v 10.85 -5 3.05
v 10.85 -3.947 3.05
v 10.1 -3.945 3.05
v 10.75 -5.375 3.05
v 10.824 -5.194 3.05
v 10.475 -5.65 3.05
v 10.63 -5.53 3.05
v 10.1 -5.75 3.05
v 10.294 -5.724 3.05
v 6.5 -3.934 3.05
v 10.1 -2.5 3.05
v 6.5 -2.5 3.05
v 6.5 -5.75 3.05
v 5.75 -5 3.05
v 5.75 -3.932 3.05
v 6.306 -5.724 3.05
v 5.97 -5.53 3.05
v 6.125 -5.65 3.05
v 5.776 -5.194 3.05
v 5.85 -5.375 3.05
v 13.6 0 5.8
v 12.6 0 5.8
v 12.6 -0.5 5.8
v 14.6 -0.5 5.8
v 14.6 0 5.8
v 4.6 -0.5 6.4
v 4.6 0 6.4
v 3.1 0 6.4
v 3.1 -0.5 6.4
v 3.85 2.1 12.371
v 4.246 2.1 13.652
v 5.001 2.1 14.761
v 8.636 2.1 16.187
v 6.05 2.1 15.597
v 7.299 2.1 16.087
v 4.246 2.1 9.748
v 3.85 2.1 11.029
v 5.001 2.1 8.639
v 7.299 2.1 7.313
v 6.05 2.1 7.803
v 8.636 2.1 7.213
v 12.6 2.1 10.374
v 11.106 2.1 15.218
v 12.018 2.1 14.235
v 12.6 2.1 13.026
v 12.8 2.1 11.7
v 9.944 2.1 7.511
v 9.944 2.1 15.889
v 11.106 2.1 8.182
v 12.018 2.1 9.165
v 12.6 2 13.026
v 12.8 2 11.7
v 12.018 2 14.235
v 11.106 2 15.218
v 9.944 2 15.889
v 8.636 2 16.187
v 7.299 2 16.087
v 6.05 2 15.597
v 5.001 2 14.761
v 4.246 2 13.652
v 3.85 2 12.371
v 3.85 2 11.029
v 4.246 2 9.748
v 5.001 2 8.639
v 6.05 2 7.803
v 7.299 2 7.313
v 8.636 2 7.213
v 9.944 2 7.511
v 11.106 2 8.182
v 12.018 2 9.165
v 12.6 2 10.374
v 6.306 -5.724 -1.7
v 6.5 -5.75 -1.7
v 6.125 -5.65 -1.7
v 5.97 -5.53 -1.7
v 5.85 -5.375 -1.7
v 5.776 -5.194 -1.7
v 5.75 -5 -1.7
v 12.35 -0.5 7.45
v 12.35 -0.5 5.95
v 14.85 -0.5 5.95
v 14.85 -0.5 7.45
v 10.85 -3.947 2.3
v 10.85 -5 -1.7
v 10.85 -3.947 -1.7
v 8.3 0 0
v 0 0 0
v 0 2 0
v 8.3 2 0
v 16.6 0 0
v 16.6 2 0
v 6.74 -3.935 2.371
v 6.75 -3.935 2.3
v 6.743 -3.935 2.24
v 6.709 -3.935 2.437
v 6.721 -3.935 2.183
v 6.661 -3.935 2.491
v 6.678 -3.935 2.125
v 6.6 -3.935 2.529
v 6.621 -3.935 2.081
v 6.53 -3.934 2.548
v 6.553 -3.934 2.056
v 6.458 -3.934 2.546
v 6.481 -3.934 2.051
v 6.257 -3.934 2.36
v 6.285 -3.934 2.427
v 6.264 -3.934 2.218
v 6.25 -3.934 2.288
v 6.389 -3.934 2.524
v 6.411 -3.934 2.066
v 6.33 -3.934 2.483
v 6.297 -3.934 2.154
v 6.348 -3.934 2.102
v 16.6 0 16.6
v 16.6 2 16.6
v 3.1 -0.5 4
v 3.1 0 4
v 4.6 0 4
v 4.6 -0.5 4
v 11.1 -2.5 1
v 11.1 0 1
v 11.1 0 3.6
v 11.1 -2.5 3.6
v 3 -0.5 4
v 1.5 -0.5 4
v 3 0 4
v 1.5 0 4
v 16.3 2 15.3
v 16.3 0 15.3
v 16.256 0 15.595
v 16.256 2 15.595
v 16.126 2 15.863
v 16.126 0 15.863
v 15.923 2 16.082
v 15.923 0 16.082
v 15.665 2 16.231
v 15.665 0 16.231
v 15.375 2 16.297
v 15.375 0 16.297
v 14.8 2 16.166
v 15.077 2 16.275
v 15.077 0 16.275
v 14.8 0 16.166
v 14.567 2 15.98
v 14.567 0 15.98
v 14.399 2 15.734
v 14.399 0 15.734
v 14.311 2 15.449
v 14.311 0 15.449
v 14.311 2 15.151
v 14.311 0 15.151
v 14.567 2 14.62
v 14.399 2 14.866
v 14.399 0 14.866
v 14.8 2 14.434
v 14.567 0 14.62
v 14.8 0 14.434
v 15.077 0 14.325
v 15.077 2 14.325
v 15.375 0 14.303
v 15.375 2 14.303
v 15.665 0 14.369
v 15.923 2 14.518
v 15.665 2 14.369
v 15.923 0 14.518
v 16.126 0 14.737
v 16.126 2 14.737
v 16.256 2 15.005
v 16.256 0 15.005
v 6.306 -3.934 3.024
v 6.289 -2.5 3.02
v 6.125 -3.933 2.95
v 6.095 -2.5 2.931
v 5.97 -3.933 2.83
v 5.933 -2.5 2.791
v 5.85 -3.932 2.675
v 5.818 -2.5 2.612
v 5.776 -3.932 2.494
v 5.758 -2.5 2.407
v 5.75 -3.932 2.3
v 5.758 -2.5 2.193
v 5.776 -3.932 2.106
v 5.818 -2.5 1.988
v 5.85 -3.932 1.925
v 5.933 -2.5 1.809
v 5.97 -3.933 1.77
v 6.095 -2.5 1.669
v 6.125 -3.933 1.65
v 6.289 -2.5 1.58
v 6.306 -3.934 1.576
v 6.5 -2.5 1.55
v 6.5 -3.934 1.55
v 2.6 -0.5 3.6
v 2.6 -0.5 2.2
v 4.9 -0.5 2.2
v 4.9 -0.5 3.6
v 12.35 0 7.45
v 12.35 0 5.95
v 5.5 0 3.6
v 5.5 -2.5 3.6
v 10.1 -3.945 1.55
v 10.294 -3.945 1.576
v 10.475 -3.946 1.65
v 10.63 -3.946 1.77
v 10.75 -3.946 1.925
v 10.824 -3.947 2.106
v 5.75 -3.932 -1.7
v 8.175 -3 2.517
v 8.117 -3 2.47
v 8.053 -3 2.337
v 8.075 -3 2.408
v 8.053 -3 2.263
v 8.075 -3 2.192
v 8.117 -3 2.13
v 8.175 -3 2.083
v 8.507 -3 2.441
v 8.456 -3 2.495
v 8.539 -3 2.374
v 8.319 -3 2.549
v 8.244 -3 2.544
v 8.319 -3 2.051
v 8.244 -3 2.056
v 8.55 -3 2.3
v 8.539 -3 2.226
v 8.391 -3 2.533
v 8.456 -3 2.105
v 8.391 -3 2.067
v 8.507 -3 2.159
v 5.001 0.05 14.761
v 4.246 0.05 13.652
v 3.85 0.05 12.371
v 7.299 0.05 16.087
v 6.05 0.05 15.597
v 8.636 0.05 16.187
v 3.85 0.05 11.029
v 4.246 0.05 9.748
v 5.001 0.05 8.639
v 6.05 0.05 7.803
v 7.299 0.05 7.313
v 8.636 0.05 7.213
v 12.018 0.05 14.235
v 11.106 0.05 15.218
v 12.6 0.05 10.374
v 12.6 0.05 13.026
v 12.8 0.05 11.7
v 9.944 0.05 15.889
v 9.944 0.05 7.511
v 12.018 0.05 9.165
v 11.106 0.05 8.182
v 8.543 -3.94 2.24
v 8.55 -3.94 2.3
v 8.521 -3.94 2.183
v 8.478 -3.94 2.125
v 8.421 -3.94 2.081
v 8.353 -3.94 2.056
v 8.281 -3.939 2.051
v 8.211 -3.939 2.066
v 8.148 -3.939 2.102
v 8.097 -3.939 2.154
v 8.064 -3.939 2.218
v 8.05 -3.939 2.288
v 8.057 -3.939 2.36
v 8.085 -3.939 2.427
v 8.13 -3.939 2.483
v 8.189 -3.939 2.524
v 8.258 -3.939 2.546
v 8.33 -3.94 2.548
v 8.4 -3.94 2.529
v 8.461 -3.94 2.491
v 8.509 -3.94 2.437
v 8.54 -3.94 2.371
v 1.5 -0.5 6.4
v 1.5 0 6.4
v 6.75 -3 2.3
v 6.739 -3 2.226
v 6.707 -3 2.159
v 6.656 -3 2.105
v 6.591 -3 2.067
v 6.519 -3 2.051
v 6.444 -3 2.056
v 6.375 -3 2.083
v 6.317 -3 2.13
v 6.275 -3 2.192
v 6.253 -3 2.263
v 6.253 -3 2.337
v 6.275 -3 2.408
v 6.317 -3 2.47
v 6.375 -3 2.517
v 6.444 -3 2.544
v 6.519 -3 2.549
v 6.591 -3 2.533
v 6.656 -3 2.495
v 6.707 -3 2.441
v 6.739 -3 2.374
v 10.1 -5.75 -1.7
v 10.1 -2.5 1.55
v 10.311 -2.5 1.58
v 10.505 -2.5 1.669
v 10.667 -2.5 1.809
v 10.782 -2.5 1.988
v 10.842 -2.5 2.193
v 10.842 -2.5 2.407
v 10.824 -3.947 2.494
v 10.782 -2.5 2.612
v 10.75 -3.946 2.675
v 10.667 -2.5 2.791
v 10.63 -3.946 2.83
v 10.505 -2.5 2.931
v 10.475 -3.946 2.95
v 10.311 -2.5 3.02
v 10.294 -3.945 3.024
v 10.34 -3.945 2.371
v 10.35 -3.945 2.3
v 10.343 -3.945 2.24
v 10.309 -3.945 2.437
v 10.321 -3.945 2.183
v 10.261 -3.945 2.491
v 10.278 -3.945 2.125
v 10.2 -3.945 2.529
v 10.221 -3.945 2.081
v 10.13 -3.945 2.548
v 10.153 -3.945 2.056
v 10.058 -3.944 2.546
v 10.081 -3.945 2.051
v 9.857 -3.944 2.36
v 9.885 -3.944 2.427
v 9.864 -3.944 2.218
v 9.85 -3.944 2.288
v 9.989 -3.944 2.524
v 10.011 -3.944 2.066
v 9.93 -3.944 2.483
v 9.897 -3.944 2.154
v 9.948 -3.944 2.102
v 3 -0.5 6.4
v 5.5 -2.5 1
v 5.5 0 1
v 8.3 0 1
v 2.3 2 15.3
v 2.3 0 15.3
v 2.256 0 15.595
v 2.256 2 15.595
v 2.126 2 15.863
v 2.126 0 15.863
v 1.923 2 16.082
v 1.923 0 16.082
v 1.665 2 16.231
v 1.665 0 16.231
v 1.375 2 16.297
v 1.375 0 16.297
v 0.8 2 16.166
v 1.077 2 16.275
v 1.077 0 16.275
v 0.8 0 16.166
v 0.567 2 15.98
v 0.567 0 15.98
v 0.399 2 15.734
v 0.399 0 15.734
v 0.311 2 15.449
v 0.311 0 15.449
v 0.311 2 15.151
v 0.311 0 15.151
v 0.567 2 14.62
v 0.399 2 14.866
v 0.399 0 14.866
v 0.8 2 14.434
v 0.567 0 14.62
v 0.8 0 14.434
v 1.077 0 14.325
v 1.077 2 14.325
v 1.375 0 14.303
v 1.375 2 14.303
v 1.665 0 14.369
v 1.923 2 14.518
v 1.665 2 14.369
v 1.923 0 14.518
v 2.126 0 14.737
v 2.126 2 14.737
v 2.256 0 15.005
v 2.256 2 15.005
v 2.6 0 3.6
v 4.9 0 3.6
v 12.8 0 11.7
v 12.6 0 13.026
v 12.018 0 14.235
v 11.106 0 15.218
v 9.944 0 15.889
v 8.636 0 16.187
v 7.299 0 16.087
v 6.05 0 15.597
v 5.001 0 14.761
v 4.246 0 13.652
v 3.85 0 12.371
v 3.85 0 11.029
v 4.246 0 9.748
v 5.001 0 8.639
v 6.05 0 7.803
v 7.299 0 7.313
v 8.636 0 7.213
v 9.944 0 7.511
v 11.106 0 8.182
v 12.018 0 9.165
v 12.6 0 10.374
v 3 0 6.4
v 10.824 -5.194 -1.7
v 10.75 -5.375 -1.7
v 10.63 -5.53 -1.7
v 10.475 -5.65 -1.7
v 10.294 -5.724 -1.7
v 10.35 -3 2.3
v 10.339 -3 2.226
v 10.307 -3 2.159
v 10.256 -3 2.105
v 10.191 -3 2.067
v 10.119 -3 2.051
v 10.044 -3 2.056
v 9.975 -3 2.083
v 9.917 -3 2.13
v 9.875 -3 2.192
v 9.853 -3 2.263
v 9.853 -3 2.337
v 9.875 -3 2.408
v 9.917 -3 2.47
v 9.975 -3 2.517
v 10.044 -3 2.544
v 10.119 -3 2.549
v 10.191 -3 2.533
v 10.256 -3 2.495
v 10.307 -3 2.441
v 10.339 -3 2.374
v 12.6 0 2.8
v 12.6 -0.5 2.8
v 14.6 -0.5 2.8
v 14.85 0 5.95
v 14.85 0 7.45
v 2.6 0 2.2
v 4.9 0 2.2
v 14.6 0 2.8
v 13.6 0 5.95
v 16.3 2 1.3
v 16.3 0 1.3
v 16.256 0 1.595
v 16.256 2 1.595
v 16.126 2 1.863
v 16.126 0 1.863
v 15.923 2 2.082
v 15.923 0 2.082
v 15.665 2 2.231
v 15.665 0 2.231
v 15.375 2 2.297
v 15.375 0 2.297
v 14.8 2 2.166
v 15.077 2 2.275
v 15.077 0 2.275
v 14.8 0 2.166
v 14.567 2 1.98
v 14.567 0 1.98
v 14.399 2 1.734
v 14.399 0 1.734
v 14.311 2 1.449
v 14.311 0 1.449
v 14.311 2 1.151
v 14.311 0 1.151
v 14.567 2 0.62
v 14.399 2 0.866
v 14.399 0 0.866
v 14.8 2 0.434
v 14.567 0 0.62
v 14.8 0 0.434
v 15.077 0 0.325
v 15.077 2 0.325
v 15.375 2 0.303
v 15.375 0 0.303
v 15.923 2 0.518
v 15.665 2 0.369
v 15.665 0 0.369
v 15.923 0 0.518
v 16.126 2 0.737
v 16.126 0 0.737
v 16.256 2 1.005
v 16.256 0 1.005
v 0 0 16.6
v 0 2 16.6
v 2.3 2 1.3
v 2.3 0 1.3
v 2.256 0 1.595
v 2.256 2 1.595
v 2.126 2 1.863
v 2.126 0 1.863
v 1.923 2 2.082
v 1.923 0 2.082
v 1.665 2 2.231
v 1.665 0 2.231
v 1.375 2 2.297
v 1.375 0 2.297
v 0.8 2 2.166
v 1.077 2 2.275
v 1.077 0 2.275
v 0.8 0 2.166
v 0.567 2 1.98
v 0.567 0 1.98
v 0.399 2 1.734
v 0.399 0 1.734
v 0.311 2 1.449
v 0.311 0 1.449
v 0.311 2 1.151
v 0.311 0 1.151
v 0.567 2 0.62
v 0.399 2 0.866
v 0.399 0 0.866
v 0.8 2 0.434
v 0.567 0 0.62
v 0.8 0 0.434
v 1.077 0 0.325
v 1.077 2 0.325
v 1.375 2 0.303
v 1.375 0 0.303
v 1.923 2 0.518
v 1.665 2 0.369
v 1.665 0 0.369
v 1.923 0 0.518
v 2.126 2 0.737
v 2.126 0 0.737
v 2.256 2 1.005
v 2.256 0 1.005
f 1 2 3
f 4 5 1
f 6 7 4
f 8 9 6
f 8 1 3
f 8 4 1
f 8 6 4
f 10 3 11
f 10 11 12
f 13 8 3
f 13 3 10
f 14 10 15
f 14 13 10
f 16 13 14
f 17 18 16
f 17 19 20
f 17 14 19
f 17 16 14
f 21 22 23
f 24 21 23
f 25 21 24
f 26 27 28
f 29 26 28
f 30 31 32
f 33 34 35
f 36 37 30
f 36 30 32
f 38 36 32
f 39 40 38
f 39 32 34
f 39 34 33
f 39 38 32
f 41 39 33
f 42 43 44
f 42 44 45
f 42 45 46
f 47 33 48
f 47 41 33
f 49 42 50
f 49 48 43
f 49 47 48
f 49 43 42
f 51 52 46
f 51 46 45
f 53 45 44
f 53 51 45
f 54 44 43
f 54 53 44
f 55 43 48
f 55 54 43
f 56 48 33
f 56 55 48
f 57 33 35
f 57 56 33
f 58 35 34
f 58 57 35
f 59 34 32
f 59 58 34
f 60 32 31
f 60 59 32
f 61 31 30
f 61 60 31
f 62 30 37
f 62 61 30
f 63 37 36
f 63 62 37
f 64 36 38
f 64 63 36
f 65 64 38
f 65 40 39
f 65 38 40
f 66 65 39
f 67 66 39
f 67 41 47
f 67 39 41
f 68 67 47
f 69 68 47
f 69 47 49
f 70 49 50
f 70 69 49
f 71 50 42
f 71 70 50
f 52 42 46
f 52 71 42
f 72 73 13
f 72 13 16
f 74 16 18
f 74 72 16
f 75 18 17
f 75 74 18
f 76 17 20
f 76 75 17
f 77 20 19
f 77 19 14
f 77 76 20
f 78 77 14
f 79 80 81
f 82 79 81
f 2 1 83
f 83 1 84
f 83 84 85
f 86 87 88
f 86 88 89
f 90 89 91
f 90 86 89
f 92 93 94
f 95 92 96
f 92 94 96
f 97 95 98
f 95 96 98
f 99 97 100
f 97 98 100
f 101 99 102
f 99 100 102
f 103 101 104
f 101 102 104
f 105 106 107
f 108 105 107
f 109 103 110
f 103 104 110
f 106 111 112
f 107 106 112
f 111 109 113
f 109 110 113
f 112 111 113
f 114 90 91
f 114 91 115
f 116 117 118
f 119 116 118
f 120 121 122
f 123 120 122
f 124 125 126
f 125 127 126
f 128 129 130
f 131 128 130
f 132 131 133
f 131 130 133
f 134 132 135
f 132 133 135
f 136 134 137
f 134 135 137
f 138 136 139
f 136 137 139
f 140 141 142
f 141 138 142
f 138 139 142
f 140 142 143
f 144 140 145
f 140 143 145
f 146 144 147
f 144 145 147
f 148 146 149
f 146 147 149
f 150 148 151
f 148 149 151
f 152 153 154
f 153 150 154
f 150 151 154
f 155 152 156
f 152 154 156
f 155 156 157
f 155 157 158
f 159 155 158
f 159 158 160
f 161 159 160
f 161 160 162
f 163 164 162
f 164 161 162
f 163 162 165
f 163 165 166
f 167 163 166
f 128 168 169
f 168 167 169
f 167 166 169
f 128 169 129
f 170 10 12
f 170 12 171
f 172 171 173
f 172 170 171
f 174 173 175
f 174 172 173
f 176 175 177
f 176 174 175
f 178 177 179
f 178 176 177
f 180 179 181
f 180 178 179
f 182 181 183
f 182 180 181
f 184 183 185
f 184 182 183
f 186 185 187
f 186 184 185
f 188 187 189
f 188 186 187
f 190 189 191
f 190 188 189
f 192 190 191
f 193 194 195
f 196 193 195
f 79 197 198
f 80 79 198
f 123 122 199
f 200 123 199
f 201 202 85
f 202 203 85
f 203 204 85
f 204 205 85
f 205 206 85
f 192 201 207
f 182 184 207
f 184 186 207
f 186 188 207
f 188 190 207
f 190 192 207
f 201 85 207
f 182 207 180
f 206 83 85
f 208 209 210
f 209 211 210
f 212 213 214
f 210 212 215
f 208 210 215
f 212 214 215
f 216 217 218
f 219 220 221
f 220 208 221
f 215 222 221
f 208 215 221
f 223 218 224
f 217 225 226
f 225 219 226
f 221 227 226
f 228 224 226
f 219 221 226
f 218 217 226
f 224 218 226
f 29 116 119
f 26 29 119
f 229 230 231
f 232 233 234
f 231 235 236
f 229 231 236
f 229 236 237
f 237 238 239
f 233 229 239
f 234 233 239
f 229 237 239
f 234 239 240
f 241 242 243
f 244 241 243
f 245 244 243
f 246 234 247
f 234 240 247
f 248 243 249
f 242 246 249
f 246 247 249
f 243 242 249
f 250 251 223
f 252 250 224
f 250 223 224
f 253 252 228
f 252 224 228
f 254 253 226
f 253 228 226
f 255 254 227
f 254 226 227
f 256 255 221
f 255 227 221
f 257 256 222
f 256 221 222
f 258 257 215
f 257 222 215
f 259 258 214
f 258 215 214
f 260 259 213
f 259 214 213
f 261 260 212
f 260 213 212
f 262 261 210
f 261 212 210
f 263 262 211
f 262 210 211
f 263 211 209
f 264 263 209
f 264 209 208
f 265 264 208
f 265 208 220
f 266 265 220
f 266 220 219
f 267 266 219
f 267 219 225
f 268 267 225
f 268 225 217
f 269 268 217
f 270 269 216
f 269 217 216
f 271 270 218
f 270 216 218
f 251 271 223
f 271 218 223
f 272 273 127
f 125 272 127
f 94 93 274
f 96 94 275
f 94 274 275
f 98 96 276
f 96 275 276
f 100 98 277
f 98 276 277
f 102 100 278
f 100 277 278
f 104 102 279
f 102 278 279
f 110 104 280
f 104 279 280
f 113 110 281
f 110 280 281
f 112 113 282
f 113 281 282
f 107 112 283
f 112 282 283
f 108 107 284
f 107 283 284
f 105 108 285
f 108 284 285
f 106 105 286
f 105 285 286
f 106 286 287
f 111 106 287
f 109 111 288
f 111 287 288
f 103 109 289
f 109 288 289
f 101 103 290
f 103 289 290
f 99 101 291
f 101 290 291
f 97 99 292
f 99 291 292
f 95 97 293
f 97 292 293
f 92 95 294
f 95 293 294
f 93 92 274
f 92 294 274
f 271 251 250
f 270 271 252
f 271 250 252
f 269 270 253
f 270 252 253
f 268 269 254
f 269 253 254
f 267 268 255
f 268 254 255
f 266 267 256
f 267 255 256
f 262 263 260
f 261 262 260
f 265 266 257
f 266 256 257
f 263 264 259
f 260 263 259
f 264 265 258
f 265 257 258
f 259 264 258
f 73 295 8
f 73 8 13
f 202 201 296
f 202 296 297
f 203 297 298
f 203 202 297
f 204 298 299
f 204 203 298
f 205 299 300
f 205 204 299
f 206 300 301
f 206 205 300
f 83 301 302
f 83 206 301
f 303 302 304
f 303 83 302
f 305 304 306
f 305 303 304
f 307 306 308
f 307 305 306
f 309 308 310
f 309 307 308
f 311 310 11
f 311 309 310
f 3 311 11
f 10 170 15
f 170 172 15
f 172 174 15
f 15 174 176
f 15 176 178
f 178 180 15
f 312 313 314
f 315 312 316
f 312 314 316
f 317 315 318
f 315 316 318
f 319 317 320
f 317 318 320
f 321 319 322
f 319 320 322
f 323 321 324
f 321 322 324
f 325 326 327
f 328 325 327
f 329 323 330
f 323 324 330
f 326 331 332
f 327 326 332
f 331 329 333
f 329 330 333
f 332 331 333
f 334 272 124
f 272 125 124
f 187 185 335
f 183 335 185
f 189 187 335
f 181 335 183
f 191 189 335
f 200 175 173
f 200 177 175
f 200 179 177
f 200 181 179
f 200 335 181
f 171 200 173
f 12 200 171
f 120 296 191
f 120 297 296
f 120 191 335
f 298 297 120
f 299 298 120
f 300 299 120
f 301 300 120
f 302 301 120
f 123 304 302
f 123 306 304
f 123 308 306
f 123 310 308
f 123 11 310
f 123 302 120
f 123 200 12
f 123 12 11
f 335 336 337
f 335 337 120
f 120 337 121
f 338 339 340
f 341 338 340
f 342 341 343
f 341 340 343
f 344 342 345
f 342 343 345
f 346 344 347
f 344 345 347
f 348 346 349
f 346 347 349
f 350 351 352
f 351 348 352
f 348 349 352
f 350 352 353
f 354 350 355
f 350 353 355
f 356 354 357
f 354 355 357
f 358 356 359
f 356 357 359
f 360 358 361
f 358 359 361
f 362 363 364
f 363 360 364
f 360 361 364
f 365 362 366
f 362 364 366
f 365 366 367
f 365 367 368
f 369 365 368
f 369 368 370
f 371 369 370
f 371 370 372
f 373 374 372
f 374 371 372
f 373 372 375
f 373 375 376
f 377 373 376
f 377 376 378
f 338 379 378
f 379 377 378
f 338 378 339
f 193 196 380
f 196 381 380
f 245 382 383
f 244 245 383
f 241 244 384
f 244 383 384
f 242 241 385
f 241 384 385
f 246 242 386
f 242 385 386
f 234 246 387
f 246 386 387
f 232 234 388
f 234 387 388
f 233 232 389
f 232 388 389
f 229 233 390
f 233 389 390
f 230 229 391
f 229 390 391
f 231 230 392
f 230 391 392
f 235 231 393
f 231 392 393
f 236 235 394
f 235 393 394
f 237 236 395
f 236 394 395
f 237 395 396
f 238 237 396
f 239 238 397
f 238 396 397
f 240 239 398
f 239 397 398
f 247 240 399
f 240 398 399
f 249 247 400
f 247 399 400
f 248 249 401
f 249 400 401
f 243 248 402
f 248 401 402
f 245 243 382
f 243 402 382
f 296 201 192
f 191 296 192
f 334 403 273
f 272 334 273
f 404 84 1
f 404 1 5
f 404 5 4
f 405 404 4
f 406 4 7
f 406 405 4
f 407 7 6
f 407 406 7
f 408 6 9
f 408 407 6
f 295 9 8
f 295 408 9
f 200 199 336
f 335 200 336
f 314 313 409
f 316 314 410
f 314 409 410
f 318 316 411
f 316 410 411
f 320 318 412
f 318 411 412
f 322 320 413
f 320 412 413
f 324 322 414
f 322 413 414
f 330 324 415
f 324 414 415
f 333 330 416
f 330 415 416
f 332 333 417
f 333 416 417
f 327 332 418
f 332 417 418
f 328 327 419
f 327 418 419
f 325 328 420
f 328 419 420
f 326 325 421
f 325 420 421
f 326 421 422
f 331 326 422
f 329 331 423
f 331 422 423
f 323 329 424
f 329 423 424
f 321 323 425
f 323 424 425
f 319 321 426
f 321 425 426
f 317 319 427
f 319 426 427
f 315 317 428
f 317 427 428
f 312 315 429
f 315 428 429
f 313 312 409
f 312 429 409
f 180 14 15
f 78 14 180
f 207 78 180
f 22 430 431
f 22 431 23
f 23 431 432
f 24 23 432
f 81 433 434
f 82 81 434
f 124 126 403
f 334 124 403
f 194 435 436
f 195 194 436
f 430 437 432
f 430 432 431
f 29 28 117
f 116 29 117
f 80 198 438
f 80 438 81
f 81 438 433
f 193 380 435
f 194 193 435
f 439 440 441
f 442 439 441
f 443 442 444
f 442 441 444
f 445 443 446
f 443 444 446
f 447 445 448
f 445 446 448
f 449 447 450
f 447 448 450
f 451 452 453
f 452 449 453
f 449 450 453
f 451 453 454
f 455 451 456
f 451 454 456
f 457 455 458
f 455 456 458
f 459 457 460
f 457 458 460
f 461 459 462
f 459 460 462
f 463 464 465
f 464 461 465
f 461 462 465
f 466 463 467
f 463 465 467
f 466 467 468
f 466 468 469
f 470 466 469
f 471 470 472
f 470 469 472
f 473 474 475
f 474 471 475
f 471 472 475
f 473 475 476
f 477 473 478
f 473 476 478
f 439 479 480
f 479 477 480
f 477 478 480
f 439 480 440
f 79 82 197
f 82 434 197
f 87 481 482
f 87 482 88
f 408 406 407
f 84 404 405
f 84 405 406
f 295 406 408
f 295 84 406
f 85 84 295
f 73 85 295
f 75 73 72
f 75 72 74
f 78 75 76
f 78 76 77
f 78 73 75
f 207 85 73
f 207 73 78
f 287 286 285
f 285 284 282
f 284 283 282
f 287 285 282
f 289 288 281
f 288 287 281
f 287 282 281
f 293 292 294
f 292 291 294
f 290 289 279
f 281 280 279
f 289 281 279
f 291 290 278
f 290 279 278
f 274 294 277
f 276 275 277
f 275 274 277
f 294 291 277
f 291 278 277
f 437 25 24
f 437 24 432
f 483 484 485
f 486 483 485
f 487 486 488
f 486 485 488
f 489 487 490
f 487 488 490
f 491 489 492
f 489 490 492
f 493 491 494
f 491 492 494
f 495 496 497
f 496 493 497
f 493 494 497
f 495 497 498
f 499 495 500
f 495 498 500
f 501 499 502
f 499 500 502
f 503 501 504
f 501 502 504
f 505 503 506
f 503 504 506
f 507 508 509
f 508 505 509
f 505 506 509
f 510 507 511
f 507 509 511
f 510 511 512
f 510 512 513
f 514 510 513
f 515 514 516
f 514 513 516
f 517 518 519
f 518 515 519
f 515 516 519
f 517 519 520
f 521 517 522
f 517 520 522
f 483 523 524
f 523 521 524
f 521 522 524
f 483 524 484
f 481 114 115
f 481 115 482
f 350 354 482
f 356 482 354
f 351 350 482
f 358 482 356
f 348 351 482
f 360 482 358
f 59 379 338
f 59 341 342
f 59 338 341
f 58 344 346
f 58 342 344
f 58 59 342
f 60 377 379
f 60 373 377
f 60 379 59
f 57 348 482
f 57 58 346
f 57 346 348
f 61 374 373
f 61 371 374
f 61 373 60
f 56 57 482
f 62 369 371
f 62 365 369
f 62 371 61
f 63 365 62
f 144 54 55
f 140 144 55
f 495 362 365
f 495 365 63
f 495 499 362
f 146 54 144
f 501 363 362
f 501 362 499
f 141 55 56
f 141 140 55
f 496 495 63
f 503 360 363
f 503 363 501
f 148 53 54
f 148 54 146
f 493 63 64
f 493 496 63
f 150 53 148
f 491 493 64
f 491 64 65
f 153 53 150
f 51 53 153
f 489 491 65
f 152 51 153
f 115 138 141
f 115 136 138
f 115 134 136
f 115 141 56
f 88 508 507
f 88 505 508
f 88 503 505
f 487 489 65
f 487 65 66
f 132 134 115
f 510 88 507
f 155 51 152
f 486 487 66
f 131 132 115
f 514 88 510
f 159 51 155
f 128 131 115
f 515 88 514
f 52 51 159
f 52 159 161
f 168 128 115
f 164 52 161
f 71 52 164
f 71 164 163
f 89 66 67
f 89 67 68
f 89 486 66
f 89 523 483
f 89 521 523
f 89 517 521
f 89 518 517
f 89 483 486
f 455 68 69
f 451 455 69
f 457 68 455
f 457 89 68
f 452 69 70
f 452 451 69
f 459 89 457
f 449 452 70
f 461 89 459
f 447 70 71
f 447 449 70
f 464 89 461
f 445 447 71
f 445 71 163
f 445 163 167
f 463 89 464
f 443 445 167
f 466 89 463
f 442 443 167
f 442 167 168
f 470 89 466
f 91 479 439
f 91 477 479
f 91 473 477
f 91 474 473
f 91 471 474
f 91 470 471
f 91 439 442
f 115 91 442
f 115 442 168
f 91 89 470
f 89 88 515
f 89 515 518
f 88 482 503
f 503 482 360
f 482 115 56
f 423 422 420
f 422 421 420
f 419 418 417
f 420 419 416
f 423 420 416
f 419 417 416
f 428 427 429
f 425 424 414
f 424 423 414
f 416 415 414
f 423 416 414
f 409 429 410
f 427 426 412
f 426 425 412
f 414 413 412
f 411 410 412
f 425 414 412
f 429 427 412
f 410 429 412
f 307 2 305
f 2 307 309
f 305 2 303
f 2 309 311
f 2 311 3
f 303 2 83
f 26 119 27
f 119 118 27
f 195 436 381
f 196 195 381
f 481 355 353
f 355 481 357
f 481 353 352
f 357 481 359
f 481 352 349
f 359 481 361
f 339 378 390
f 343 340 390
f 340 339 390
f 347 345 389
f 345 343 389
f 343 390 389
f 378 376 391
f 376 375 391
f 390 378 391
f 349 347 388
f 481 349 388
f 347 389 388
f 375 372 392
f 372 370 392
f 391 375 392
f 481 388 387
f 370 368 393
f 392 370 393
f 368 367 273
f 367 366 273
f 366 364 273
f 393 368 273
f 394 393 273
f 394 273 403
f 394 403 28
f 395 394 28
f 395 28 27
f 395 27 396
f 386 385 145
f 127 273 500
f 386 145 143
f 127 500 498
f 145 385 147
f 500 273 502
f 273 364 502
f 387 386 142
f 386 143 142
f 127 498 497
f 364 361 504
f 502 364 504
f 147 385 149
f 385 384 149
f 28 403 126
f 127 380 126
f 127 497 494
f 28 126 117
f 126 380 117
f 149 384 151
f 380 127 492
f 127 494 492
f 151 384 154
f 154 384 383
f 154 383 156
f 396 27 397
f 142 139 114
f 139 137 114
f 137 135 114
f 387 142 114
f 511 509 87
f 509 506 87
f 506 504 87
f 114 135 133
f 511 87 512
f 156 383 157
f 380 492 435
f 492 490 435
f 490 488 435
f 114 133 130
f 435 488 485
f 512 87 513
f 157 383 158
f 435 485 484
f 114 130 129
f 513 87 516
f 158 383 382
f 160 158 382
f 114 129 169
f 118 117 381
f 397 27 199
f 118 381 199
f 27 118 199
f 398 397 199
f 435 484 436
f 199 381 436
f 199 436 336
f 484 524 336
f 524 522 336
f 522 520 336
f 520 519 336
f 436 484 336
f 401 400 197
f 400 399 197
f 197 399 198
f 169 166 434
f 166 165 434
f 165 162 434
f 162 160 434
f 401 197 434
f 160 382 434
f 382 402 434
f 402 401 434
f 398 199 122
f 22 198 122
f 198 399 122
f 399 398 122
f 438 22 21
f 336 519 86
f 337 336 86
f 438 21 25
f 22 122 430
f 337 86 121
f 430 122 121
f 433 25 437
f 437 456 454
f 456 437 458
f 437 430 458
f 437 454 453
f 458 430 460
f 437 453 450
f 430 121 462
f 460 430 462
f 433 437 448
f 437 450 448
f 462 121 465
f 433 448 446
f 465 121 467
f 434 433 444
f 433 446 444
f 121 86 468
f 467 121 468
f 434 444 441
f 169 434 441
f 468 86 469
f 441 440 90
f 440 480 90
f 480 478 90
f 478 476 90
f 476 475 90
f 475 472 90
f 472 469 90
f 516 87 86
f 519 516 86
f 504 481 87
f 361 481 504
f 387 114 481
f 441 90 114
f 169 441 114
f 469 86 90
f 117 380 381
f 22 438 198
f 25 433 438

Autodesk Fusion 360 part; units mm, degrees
sketch "Sketch1" plane through (0, 0, 0) normal (0, 1, 0) x (1, 0, 0)
  line L0 (0, 0) -> (16.6, 0)
  line L1 (16.6, 0) -> (16.6, -16.6)
  line L2 (16.6, -16.6) -> (0, -16.6)
  line L3 (0, -16.6) -> (0, 0)
  line L4 (16.6, -16.6) -> (8.3, -16.6)
  line L5 (8.3, -16.6) -> (8.3, -11.7) construction
  circle A0 centre (8.3, -11.7) radius 4.5
  line L6 (16.6, -16.6) -> (15.3, -16.6)
  line L7 (16.6, -16.6) -> (16.6, -15.3)
  line L8 (15.3, -16.6) -> (15.3, -14) construction
  line L9 (16.6, -15.3) -> (14, -15.3) construction
  circle A1 centre (15.3, -15.3) radius 1
  circle A2 centre (1.3, -15.3) radius 1
  line L10 (0, -8.3) -> (16.6, -8.3) construction
  circle A3 centre (15.3, -1.3) radius 1
  circle A4 centre (1.3, -1.3) radius 1
  line L11 (8.3, 0) -> (8.3, -3.6)
  line L12 (5.5, -1) -> (11.1, -1)
  line L13 (11.1, -1) -> (11.1, -3.6)
  line L14 (11.1, -3.6) -> (5.5, -3.6)
  line L15 (5.5, -3.6) -> (5.5, -1)
  line L16 (13.6, 0) -> (13.6, -5.6) construction
  line L17 (16.6, -5.8) -> (13.6, -5.8) construction
  line L18 (14.6, -2.8) -> (12.6, -2.8)
  line L19 (12.6, -2.8) -> (12.6, -5.8)
  line L20 (12.6, -5.8) -> (14.6, -5.8)
  line L21 (14.6, -5.8) -> (14.6, -2.8)
  line L22 (3.0224, 0) -> (3.0224, -2.2) construction
  line L23 (0, -2.5501) -> (2.6, -2.5501) construction
  line L24 (2.6, -2.2) -> (4.9, -2.2)
  line L25 (4.9, -2.2) -> (4.9, -3.6)
  line L26 (4.9, -3.6) -> (2.6, -3.6)
  line L27 (2.6, -3.6) -> (2.6, -2.2)
  line L28 (0, -5.4812) -> (1.5, -5.4812) construction
  line L29 (2, 0) -> (2, -4) construction
  line L30 (1.5, -4) -> (3, -4)
  line L31 (3, -4) -> (3, -6.4)
  line L32 (3, -6.4) -> (1.5, -6.4)
  line L33 (1.5, -6.4) -> (1.5, -4)
  line L34 (3.1, -4) -> (4.6, -4)
  line L35 (4.6, -4) -> (4.6, -6.4)
  line L36 (4.6, -6.4) -> (3.1, -6.4)
  line L37 (3.1, -6.4) -> (3.1, -4)
  line L38 (0, -6) -> (3.1, -6) construction
  line L39 (12.35, -5.95) -> (14.85, -5.95)
  line L40 (14.85, -5.95) -> (14.85, -7.45)
  line L41 (14.85, -7.45) -> (12.35, -7.45)
  line L42 (12.35, -7.45) -> (12.35, -5.95)
  line L43 (13.6, -5.8) -> (13.6, -5.95)
  dimension "d1" = 16.6
  dimension "d2" = 16.6
  dimension "d3" = 8.3
  dimension "d4" = 4.9
  dimension "d5" = 9
  dimension "d6" = 1.3
  dimension "d7" = 1.3
  dimension "d8" = 2
  dimension "d9" = 3.6
  dimension "d10" = 5.6
  dimension "d11" = 2.6
  dimension "d12" = 5.6
  dimension "d13" = 3
  dimension "d14" = 2
  dimension "d15" = 3
  dimension "d16" = 2.8
  dimension "d17" = 2.2
  dimension "d18" = 2.6
  dimension "d19" = 2.3
  dimension "d20" = 1.4
  dimension "d21" = 1.5
  dimension "d22" = 4
  dimension "d23" = 1.5
  dimension "d24" = 2.4
  dimension "d25" = 1.5
  dimension "d26" = 2.4
  dimension "d27" = 3.1
  dimension "d28" = 2.5
  dimension "d29" = 1.5
  dimension "d30" = 0.15
extrude "Extrude1" add sketch "Sketch1" along normal blind 2 contours L11 L12 L13 L14 | L11 L12 L14 L15 | L0 L1 L2 L3 L4 L6 L7 | A0 | L18 L19 L20 L21 | L39 L40 L41 L42 | L24 L25 L26 L27 | L30 L31 L32 L33 | L34 L35 L36 L37 makes body 1
extrude "Extrude2" add sketch "Sketch1" along normal blind 2.1 contours A0 bodies 1
extrude "Extrude3" cut sketch "Sketch1" along normal blind 0.05 contours A0 bodies 1
extrude "Extrude4" add sketch "Sketch1" against normal blind 0.5 contours L18 L19 L20 L21 | L39 L40 L41 L42 | L24 L25 L26 L27 | L30 L31 L32 L33 | L34 L35 L36 L37 bodies 1
extrude "Extrude5" add sketch "Sketch1" against normal blind 3 contours L11 L12 L13 L14 | L11 L12 L14 L15 bodies 1
sketch "Sketch2" plane through (0, -3, 0) normal (0, -1, 0) x (1, 0, 0)
  line L0 (11.1, 3.6) -> (5.5, 3.6)
  line L1 (5.5, 3.6) -> (5.5, 1)
  line L2 (5.5, 1) -> (11.1, 1)
  line L3 (11.1, 1) -> (11.1, 3.6)
  line L4 (5.5, 2.3) -> (11.1, 2.3)
  circle A0 centre (8.3, 2.3) radius 0.25
  line L5 (5.5, 2.3) -> (6.5, 2.3)
  circle A1 centre (6.5, 2.3) radius 0.25
  line L6 (11.1, 2.3) -> (10.1, 2.3)
  circle A2 centre (10.1, 2.3) radius 0.25
  circle A3 centre (6.5, 2.3) radius 0.75
  circle A4 centre (10.1, 2.3) radius 0.75
  line L7 (10.1, 3.05) -> (6.5, 3.05)
  line L8 (10.1, 1.55) -> (6.5, 1.55)
  dimension "d41" = 0.5
  dimension "d42" = 1
  dimension "d43" = 0.5
  dimension "d44" = 1
  dimension "d45" = 0.5
  dimension "d46" = 1.5
  dimension "d47" = 1.5
extrude "Extrude6" add sketch "Sketch2" along normal blind 3 separate body contours L4 L6 A2 A4 | L4 L6 A2 A4 | L4 L5 A1 A3 | L4 L5 A1 A3 | L4 A0 A3 A4 L7 | L4 A0 A3 A4 L8 makes body 2
extrude "Extrude7" add sketch "Sketch2" along normal blind 4.5 separate body contours L4 A0 A3 A4 L7 makes body 3
sketch "Sketch3" plane through (0, 0, 2.3) normal (0, 0, -1) x (-1, 0, 0)
  line L0 (-7.25, -3) -> (-8.05, -3)
  line L1 (-8.05, -3) -> (-8.05, -7.5)
  line L2 (-8.05, -7.5) -> (-7.25, -7.5)
  line L3 (-7.25, -7.5) -> (-7.25, -3)
  line L4 (-7.65, -7.5) -> (-8.3, -7.5)
  line L5 (-7.65, -7.5) -> (-6.5, -7.5)
  line L6 (-6.5, -7.5) -> (-6.5, -6.75)
  circle A0 centre (-6.5, -6.75) radius 0.75
  line L7 (-5.75, -6.75) -> (-5.75, -5.6822)
  line L8 (-5.75, -5.6822) -> (-6.7545, -6.0445)
  line L9 (-8.3, -7.5) -> (-10.1, -7.5)
  line L10 (-10.1, -7.5) -> (-10.1, -6.75)
  circle A1 centre (-10.1, -6.75) radius 0.75
  line L11 (-10.85, -6.75) -> (-10.85, -5.6967)
  line L12 (-10.85, -5.6967) -> (-9.8547, -6.0413)
  line L13 (-10.85, -5.6967) -> (-5.75, -5.6822)
  dimension "d52" = 0.65
  dimension "d53" = 1.15
  dimension "d54" = 0.75
  dimension "d55" = 1.5
  dimension "d56" = 1.8
  dimension "d57" = 0.75
  dimension "d58" = 1.5
delete_body "RemoveBody1" bodies 3
extrude "Extrude8" add sketch "Sketch3" along normal blind -0.75 and the other way blind -4 separate body contours L3 A0 L8 L13 | L1 L2 L3 L4 L5 L13 | L1 L4 L9 A1 L12 L13 | L3 L5 A0 | A0 | A0 L7 L8 | A1 L11 L12 | A1 makes body 4
extrude "Extrude9" cut 1 faces at (8.3062, -6, 1.7169) along direction (0, 1, 0) blind 1.75 on bodies 2 bodies 2
extrude "Extrude10" cut sketch "Sketch2" against normal blind 0.5 contours L0 L1 L3 L4 L5 L6 A3 A4 L7 | L1 L2 L3 L4 L5 L6 A3 A4 L8 bodies 1
move_body "Move1" bodies 4 to x (1, 0, 0) y (0, 1, 0) z (0, 0, 1) at (0, 1.75, 0)
combine "Combine1" operation add target body 1 tool bodies 2 4
